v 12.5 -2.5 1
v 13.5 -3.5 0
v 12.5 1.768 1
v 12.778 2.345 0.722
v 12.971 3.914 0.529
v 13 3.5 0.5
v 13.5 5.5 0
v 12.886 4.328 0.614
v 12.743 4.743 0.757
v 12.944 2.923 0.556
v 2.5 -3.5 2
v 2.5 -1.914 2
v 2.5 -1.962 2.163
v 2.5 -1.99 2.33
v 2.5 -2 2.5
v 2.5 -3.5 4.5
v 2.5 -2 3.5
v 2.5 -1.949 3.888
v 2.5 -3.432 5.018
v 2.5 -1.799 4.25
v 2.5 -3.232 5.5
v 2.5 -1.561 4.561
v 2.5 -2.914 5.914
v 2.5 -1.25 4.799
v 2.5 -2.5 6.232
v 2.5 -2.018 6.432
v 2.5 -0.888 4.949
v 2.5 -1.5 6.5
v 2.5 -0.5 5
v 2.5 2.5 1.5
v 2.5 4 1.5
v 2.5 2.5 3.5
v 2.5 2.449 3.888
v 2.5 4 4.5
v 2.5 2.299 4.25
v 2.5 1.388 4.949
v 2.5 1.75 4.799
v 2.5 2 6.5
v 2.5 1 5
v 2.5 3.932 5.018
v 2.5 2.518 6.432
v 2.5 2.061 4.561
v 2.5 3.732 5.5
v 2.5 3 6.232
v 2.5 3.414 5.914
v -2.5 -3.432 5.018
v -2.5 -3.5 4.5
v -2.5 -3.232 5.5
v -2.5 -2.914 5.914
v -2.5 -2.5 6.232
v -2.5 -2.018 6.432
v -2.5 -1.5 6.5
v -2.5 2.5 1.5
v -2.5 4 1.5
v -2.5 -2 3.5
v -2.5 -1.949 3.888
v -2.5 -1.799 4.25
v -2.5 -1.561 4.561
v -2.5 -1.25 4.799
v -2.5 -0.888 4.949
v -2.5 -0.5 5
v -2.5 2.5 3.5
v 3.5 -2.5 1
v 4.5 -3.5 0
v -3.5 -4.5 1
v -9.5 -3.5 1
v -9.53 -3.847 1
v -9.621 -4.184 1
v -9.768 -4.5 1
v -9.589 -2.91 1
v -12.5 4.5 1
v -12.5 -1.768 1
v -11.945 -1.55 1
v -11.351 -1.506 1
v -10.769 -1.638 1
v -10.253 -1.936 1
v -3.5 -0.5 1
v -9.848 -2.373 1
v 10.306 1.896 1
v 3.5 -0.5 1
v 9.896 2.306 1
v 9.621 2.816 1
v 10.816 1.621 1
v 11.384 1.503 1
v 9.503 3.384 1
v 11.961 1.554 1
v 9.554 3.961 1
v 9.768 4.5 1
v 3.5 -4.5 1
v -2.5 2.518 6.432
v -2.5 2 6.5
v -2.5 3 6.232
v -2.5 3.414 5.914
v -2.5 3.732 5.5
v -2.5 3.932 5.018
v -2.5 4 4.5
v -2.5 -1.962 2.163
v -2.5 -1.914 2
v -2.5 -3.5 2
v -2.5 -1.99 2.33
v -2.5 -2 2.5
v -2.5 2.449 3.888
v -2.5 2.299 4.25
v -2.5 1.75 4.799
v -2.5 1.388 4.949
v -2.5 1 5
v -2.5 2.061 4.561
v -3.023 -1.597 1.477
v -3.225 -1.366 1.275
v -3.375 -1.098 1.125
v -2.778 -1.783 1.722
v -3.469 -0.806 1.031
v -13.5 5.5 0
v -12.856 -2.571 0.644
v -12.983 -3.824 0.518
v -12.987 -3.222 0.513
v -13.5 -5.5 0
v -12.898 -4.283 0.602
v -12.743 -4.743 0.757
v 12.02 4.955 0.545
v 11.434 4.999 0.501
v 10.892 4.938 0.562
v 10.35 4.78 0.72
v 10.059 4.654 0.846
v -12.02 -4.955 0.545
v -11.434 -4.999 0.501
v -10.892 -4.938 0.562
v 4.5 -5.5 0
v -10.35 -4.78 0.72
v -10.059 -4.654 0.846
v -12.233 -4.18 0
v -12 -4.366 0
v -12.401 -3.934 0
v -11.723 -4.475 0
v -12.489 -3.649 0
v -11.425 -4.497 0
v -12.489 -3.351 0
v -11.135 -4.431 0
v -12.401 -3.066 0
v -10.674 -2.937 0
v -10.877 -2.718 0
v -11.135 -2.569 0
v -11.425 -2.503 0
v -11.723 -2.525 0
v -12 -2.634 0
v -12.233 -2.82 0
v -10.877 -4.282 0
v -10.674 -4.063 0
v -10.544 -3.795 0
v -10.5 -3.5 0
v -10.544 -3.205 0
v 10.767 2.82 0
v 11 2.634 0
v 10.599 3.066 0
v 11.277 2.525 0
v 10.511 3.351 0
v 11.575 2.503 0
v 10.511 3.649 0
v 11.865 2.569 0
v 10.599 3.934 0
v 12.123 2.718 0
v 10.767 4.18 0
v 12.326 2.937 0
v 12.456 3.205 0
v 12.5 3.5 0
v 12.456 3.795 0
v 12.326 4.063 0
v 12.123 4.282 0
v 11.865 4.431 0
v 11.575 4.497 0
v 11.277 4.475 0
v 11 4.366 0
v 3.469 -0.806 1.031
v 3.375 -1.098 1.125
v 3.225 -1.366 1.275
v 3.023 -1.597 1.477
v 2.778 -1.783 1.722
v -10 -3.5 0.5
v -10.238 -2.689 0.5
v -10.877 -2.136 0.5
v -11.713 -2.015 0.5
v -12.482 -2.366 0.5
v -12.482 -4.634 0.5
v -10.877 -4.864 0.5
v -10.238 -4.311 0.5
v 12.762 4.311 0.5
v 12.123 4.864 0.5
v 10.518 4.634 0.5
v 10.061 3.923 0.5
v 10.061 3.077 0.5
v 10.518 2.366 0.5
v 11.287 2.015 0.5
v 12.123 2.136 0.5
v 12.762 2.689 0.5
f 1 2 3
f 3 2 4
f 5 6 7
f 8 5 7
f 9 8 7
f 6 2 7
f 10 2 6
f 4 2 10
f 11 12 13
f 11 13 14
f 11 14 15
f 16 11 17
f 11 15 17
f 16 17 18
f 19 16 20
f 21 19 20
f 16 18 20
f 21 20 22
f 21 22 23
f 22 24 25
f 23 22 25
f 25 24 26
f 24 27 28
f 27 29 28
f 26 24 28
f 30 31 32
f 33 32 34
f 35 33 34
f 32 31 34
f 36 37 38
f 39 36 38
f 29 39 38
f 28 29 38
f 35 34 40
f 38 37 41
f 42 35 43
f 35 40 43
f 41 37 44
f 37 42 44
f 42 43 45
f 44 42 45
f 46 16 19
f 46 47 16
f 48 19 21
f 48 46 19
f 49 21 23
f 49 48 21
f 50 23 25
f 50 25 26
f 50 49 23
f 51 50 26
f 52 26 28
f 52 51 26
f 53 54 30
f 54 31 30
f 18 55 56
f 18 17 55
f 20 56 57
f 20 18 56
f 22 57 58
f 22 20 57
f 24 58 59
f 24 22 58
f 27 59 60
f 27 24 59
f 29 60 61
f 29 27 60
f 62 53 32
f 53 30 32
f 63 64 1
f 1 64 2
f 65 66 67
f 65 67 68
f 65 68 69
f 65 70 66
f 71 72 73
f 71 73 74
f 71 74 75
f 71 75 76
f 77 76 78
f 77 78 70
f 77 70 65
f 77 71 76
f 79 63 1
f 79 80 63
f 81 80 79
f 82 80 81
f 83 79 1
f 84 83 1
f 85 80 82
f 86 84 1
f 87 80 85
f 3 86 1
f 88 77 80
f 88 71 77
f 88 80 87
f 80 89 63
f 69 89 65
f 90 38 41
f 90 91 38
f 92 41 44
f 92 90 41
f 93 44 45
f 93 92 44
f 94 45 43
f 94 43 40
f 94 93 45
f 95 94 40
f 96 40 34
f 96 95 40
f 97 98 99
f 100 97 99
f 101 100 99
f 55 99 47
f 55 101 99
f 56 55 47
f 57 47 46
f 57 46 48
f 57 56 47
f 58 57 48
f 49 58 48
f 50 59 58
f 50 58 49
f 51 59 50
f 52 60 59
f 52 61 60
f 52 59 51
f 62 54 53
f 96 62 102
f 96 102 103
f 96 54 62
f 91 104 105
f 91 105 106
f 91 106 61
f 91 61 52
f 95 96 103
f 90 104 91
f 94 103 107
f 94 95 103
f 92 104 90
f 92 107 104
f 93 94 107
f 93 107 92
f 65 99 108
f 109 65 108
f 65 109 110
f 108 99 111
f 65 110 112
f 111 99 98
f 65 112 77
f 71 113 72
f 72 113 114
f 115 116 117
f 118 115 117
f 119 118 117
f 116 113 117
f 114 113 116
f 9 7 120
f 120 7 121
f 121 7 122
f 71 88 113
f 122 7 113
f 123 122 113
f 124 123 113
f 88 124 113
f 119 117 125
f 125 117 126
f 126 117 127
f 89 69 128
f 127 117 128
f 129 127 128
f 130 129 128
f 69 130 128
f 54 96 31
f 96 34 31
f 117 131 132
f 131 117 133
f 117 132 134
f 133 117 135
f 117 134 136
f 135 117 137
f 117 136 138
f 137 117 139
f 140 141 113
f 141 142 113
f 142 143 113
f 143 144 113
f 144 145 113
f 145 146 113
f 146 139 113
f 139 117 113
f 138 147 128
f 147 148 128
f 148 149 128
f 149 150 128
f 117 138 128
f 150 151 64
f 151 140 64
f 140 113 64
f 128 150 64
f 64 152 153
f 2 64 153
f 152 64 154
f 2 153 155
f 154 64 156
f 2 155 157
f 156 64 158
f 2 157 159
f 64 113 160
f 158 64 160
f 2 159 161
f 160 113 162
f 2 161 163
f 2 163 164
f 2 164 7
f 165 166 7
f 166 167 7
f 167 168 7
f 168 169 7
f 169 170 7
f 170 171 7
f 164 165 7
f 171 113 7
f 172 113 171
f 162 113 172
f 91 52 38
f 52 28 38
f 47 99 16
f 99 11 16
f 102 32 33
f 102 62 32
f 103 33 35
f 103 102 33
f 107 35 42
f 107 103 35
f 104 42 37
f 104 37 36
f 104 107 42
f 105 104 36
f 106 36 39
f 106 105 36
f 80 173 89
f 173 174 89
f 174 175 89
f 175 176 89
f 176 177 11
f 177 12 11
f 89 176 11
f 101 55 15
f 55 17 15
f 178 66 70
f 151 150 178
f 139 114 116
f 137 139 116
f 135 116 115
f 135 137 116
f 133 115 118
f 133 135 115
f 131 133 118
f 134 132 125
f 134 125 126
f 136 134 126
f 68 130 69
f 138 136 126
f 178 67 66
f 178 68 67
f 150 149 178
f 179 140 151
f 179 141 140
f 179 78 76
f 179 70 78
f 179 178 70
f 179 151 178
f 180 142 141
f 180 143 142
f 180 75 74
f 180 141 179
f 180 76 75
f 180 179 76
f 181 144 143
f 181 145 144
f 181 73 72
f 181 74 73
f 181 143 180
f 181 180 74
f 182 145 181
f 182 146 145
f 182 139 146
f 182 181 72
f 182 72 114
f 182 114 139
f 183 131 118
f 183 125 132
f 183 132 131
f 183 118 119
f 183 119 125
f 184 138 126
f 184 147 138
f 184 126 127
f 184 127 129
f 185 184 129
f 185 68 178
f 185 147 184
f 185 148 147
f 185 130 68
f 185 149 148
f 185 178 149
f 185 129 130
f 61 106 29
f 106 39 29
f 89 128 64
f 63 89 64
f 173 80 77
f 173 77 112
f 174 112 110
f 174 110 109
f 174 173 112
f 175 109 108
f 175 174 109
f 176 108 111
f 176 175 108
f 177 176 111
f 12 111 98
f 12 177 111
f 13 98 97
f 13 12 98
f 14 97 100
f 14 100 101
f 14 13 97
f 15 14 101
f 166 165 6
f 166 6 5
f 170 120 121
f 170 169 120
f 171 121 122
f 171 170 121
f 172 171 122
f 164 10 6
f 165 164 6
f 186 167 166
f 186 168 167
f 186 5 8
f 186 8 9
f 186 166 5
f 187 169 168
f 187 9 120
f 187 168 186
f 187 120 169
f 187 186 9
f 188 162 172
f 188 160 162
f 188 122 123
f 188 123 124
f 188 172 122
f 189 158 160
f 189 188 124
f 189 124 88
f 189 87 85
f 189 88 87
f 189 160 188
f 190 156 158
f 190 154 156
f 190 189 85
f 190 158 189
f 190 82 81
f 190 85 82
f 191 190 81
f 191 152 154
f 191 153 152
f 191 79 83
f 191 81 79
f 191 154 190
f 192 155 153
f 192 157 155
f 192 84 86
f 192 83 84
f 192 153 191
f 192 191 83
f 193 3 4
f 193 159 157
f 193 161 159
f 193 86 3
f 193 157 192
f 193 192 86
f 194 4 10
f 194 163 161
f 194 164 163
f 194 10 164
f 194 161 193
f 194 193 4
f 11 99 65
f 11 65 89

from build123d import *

# Parameters (mm, degrees)
SKETCH1_R           = 1
BOSS_EXTRUDE1_DEPTH = 1
BOSS_EXTRUDE6_DEPTH = 2.5
FILLET6_R           = 1.5
FILLET7_R           = 2
CHAMFER1_SIZE       = 1


# Some blends are built 0.0001 mm under size
with BuildPart() as part:
    # Sketch1 → Boss-Extrude1 (new body)
    with BuildSketch(Plane.XY):
        Polygon((-13.5, 5.5), (-13.5, -5.5), (4.5, -5.5), (4.5, -3.5), (13.5, -3.5), (13.5, 5.5), align=None)
        with Locations((-11.5, -3.5)):
            Circle(SKETCH1_R, mode=Mode.SUBTRACT)
        with Locations((11.5, 3.5)):
            Circle(SKETCH1_R, mode=Mode.SUBTRACT)
    extrude(amount=BOSS_EXTRUDE1_DEPTH)

    # Sketch3 → Boss-Extrude6 (add, symmetric)
    with BuildSketch(Plane(origin=(0, 0, 0), x_dir=(0, 0, -1), z_dir=(1, 0, 0))):
        Polygon((-1, -3.5), (-6.5, -3.5), (-6.5, 4), (-1.5, 4), (-1.5, 2.5), (-5, 2.5), (-5, -2), (-1, -2), align=None)
    extrude(amount=BOSS_EXTRUDE6_DEPTH, both=True)

    # Fillet6
    fillet6_edges = [part.edges().sort_by_distance(p)[0] for p in [
        (0, -2, 1),
        (0, 2.5, 5),
        (0, -2, 5),
    ]]
    fillet(fillet6_edges, radius=FILLET6_R)

    # Fillet7
    fillet7_edges = [part.edges().sort_by_distance(p)[0] for p in [
        (0, -3.5, 6.5),
        (0, 4, 6.5),
    ]]
    fillet(fillet7_edges, radius=FILLET7_R)

    # Chamfer1
    chamfer1_edges = [part.edges().sort_by_distance(p)[0] for p in [
        (0, 5.5, 1),
    ]]
    chamfer(chamfer1_edges, length=CHAMFER1_SIZE - 0.0001)  # a hair under: the kernel refuses the full size
    chamfer1_2_edges = [part.edges().sort_by_distance(p)[0] for p in [
        (-4.5, -5.5, 1),
    ]]
    chamfer(chamfer1_2_edges, length=CHAMFER1_SIZE - 0.0001)  # a hair under: the kernel refuses the full size
    chamfer1_3_edges = [part.edges().sort_by_distance(p)[0] for p in [
        (-13.5, 0, 1),
    ]]
    chamfer(chamfer1_3_edges, length=CHAMFER1_SIZE - 0.0001)  # a hair under: the kernel refuses the full size
    chamfer1_4_edges = [part.edges().sort_by_distance(p)[0] for p in [
        (9, -3.5, 1),
    ]]
    chamfer(chamfer1_4_edges, length=CHAMFER1_SIZE - 0.0001)  # a hair under: the kernel refuses the full size
    chamfer1_5_edges = [part.edges().sort_by_distance(p)[0] for p in [
        (13.5, 1, 1),
    ]]
    chamfer(chamfer1_5_edges, length=CHAMFER1_SIZE - 0.0001)  # a hair under: the kernel refuses the full size
    chamfer1_6_edges = [part.edges().sort_by_distance(p)[0] for p in [
        (0, -3.5, 1),
    ]]
    chamfer(chamfer1_6_edges, length=CHAMFER1_SIZE)
    chamfer1_7_edges = [part.edges().sort_by_distance(p)[0] for p in [
        (-2.5, -2, 1),
    ]]
    chamfer(chamfer1_7_edges, length=CHAMFER1_SIZE)
    chamfer1_8_edges = [part.edges().sort_by_distance(p)[0] for p in [
        (2.5, -2, 1),
    ]]
    chamfer(chamfer1_8_edges, length=CHAMFER1_SIZE)
    chamfer1_9_edges = [part.edges().sort_by_distance(p)[0] for p in [
        (4.5, -4.00005, 1),
    ]]
    chamfer(chamfer1_9_edges, length=CHAMFER1_SIZE - 0.0001)  # a hair under: the kernel refuses the full size
    # the kernel refuses this chamfer: 1 mm, written as the material it takes off along each edge
    with BuildSketch(Plane(origin=(11.5, 3.5, 1), x_dir=(1, 0, 0), z_dir=(0, -1, 0))) as chamfer1_10_piece_1:
        with BuildLine():
            Line((2.028284271, 0.028284271), (0.971715729, -1.028284271))
            Line((0.971715729, -1.028284271), (0.951715729, -1.028284271))
            ThreePointArc((0.951715729, -1.028284271), (0.98, -0.514142136), (0.98, 0))
            Line((0.98, 0), (1, 0.02))
            ThreePointArc((1, 0.02), (1.514142136, 0.02), (2.028284271, 0.048284271))
            Line((2.028284271, 0.048284271), (2.028284271, 0.028284271))
        make_face()
    revolve(axis=Axis((11.5, 3.5, 1), (0, 0, 1)), mode=Mode.SUBTRACT)
    # the kernel refuses this chamfer: 1 mm, written as the material it takes off along each edge
    with BuildSketch(Plane(origin=(-11.5, -3.5, 1), x_dir=(1, 0, 0), z_dir=(0, -1, 0))) as chamfer1_11_piece_1:
        with BuildLine():
            Line((2.028284271, 0.028284271), (0.971715729, -1.028284271))
            Line((0.971715729, -1.028284271), (0.951715729, -1.028284271))
            ThreePointArc((0.951715729, -1.028284271), (0.98, -0.514142136), (0.98, 0))
            Line((0.98, 0), (1, 0.02))
            ThreePointArc((1, 0.02), (1.514142136, 0.02), (2.028284271, 0.048284271))
            Line((2.028284271, 0.048284271), (2.028284271, 0.028284271))
        make_face()
    revolve(axis=Axis((-11.5, -3.5, 1), (0, 0, 1)), mode=Mode.SUBTRACT)


solid = part.part
